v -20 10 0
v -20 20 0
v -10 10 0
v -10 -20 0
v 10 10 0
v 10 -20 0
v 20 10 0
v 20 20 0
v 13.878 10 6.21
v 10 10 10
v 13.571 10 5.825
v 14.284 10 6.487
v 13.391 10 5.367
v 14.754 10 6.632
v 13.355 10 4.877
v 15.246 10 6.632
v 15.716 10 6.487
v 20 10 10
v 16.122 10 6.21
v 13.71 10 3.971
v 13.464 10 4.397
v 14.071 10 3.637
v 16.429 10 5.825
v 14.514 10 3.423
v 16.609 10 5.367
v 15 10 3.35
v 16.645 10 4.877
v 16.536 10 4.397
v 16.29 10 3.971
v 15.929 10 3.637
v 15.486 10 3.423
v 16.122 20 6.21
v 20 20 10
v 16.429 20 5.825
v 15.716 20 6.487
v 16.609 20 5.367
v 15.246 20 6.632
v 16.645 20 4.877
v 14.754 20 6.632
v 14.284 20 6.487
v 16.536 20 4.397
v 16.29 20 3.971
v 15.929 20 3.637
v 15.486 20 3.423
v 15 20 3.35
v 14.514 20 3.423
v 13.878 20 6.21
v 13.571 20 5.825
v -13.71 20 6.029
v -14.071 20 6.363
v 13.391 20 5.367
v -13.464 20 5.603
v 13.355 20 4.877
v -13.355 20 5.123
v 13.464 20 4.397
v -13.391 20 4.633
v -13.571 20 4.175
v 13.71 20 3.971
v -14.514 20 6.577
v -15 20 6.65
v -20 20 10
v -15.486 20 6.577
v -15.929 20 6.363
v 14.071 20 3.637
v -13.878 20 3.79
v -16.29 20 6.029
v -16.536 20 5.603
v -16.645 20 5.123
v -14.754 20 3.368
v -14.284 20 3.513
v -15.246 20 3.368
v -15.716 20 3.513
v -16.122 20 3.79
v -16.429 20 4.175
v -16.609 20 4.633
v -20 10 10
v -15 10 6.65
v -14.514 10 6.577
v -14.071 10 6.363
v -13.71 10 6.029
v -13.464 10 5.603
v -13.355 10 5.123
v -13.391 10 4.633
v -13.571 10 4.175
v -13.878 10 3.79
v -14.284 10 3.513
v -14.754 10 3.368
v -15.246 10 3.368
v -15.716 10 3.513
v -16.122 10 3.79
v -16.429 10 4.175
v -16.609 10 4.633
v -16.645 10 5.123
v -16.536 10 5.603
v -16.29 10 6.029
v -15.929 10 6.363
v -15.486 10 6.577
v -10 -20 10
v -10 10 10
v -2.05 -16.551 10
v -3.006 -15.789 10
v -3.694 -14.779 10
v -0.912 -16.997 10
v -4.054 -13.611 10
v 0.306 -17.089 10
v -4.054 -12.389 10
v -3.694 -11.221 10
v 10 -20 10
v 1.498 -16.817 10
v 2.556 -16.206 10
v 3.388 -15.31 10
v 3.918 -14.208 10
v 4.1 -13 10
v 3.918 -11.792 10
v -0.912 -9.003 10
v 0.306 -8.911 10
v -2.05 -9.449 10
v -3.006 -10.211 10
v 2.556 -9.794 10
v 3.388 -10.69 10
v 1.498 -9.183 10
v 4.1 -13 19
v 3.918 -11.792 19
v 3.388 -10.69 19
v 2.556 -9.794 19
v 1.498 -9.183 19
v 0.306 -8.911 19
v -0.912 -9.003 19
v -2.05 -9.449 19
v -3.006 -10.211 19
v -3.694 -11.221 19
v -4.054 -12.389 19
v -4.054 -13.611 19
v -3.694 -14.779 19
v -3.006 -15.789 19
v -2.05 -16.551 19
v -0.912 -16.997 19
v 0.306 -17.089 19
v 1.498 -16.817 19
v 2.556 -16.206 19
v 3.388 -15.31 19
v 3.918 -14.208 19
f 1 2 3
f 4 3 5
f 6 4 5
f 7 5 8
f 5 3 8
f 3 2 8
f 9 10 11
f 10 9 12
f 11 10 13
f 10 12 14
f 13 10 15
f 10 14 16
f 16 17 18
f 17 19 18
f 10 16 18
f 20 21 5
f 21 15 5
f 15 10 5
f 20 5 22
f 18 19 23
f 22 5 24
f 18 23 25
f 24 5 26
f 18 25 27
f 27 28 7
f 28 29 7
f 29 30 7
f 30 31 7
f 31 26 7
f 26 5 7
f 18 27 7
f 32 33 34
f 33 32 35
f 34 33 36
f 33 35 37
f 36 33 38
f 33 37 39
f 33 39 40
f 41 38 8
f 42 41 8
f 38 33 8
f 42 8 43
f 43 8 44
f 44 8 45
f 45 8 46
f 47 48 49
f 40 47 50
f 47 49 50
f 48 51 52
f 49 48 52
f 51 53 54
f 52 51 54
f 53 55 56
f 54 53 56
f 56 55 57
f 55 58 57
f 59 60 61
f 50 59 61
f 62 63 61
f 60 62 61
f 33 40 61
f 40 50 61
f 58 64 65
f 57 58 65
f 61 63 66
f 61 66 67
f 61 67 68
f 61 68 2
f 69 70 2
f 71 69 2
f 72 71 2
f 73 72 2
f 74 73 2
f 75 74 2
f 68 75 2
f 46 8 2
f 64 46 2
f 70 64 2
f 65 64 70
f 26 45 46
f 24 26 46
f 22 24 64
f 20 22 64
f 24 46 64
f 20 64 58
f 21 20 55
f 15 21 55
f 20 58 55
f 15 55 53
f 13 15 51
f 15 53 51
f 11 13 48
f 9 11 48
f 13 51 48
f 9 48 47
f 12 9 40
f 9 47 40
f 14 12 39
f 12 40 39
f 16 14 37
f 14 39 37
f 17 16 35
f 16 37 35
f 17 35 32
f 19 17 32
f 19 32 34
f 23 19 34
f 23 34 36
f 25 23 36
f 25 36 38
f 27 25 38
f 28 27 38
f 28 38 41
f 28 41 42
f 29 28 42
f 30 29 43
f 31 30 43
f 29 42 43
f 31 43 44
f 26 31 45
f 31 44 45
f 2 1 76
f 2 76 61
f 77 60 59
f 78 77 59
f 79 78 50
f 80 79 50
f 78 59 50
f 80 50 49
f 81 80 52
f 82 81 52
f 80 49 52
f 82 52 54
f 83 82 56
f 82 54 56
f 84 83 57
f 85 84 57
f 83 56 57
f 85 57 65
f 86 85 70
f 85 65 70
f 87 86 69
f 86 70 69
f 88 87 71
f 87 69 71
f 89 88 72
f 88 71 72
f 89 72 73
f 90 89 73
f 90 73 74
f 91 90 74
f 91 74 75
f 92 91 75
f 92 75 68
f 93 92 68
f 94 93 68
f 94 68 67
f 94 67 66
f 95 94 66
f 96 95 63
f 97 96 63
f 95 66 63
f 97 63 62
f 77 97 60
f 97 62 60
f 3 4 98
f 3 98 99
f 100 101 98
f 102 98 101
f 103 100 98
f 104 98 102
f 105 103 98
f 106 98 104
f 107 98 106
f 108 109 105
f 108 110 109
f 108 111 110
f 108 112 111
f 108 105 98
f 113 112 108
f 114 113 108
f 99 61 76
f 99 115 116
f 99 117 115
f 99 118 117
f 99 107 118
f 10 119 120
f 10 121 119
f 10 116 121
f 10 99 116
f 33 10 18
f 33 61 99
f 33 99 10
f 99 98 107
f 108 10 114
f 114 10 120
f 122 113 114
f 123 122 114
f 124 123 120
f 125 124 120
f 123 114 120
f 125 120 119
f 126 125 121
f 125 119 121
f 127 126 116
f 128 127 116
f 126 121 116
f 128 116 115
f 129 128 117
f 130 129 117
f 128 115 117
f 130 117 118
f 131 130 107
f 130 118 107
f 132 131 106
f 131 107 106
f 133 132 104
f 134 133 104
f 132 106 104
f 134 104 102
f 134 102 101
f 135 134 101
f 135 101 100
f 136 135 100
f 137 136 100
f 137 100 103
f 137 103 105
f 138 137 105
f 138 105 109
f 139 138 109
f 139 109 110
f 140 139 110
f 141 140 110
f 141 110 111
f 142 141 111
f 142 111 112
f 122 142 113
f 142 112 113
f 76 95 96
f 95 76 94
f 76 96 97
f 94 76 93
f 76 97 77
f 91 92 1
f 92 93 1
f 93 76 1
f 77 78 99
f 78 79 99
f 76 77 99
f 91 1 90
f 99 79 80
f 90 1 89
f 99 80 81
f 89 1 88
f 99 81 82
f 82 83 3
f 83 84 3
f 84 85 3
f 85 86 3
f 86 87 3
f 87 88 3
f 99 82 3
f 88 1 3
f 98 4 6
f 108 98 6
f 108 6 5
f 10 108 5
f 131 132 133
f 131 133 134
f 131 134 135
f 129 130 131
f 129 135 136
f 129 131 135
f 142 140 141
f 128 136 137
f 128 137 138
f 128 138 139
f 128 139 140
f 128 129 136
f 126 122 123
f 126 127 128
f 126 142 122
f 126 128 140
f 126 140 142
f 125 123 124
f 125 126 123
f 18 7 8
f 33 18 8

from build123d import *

# Parameters (mm, degrees)
SKETCH_1_W          = 10
SKETCH_1_H          = 10
SKETCH_1_W_2        = 20
SKETCH_1_H_2        = 40
EXTRUDE_5_DEPTH     = 10
SKETCH_7_R          = 4.1
EXTRUDE_6_DEPTH     = 9
SKETCH_8_R          = 1.65
CUT_EXTRUDE_1_DEPTH = 10


with BuildPart() as part:
    # Эскиз1 → Бобышка-Вытянуть5 (new body)
    with BuildSketch(Plane.XY):
        with Locations((-15, 15)):
            Rectangle(SKETCH_1_W, SKETCH_1_H)
        Rectangle(SKETCH_1_W_2, SKETCH_1_H_2)
        with Locations((15, 15)):
            Rectangle(SKETCH_1_W, SKETCH_1_H)
    extrude(amount=EXTRUDE_5_DEPTH)

    # Эскиз7 → Бобышка-Вытянуть6 (add)
    with BuildSketch(Plane.XY.offset(10)):
        with Locations((0, -13)):
            Circle(SKETCH_7_R)
    extrude(amount=EXTRUDE_6_DEPTH)

    # Эскиз8 → Вырез-Вытянуть1 (cut)
    with BuildSketch(Plane(origin=(0, 20, 0), x_dir=(1, 0, 0), z_dir=(0, 1, 0))):
        with Locations(Location((-15, -5, 0), (0, 0, 270))):
            Circle(SKETCH_8_R)
        with Locations(Location((15, -5, 0), (0, 0, 90))):
            Circle(SKETCH_8_R)
    extrude(amount=-CUT_EXTRUDE_1_DEPTH, mode=Mode.SUBTRACT)


solid = part.part
